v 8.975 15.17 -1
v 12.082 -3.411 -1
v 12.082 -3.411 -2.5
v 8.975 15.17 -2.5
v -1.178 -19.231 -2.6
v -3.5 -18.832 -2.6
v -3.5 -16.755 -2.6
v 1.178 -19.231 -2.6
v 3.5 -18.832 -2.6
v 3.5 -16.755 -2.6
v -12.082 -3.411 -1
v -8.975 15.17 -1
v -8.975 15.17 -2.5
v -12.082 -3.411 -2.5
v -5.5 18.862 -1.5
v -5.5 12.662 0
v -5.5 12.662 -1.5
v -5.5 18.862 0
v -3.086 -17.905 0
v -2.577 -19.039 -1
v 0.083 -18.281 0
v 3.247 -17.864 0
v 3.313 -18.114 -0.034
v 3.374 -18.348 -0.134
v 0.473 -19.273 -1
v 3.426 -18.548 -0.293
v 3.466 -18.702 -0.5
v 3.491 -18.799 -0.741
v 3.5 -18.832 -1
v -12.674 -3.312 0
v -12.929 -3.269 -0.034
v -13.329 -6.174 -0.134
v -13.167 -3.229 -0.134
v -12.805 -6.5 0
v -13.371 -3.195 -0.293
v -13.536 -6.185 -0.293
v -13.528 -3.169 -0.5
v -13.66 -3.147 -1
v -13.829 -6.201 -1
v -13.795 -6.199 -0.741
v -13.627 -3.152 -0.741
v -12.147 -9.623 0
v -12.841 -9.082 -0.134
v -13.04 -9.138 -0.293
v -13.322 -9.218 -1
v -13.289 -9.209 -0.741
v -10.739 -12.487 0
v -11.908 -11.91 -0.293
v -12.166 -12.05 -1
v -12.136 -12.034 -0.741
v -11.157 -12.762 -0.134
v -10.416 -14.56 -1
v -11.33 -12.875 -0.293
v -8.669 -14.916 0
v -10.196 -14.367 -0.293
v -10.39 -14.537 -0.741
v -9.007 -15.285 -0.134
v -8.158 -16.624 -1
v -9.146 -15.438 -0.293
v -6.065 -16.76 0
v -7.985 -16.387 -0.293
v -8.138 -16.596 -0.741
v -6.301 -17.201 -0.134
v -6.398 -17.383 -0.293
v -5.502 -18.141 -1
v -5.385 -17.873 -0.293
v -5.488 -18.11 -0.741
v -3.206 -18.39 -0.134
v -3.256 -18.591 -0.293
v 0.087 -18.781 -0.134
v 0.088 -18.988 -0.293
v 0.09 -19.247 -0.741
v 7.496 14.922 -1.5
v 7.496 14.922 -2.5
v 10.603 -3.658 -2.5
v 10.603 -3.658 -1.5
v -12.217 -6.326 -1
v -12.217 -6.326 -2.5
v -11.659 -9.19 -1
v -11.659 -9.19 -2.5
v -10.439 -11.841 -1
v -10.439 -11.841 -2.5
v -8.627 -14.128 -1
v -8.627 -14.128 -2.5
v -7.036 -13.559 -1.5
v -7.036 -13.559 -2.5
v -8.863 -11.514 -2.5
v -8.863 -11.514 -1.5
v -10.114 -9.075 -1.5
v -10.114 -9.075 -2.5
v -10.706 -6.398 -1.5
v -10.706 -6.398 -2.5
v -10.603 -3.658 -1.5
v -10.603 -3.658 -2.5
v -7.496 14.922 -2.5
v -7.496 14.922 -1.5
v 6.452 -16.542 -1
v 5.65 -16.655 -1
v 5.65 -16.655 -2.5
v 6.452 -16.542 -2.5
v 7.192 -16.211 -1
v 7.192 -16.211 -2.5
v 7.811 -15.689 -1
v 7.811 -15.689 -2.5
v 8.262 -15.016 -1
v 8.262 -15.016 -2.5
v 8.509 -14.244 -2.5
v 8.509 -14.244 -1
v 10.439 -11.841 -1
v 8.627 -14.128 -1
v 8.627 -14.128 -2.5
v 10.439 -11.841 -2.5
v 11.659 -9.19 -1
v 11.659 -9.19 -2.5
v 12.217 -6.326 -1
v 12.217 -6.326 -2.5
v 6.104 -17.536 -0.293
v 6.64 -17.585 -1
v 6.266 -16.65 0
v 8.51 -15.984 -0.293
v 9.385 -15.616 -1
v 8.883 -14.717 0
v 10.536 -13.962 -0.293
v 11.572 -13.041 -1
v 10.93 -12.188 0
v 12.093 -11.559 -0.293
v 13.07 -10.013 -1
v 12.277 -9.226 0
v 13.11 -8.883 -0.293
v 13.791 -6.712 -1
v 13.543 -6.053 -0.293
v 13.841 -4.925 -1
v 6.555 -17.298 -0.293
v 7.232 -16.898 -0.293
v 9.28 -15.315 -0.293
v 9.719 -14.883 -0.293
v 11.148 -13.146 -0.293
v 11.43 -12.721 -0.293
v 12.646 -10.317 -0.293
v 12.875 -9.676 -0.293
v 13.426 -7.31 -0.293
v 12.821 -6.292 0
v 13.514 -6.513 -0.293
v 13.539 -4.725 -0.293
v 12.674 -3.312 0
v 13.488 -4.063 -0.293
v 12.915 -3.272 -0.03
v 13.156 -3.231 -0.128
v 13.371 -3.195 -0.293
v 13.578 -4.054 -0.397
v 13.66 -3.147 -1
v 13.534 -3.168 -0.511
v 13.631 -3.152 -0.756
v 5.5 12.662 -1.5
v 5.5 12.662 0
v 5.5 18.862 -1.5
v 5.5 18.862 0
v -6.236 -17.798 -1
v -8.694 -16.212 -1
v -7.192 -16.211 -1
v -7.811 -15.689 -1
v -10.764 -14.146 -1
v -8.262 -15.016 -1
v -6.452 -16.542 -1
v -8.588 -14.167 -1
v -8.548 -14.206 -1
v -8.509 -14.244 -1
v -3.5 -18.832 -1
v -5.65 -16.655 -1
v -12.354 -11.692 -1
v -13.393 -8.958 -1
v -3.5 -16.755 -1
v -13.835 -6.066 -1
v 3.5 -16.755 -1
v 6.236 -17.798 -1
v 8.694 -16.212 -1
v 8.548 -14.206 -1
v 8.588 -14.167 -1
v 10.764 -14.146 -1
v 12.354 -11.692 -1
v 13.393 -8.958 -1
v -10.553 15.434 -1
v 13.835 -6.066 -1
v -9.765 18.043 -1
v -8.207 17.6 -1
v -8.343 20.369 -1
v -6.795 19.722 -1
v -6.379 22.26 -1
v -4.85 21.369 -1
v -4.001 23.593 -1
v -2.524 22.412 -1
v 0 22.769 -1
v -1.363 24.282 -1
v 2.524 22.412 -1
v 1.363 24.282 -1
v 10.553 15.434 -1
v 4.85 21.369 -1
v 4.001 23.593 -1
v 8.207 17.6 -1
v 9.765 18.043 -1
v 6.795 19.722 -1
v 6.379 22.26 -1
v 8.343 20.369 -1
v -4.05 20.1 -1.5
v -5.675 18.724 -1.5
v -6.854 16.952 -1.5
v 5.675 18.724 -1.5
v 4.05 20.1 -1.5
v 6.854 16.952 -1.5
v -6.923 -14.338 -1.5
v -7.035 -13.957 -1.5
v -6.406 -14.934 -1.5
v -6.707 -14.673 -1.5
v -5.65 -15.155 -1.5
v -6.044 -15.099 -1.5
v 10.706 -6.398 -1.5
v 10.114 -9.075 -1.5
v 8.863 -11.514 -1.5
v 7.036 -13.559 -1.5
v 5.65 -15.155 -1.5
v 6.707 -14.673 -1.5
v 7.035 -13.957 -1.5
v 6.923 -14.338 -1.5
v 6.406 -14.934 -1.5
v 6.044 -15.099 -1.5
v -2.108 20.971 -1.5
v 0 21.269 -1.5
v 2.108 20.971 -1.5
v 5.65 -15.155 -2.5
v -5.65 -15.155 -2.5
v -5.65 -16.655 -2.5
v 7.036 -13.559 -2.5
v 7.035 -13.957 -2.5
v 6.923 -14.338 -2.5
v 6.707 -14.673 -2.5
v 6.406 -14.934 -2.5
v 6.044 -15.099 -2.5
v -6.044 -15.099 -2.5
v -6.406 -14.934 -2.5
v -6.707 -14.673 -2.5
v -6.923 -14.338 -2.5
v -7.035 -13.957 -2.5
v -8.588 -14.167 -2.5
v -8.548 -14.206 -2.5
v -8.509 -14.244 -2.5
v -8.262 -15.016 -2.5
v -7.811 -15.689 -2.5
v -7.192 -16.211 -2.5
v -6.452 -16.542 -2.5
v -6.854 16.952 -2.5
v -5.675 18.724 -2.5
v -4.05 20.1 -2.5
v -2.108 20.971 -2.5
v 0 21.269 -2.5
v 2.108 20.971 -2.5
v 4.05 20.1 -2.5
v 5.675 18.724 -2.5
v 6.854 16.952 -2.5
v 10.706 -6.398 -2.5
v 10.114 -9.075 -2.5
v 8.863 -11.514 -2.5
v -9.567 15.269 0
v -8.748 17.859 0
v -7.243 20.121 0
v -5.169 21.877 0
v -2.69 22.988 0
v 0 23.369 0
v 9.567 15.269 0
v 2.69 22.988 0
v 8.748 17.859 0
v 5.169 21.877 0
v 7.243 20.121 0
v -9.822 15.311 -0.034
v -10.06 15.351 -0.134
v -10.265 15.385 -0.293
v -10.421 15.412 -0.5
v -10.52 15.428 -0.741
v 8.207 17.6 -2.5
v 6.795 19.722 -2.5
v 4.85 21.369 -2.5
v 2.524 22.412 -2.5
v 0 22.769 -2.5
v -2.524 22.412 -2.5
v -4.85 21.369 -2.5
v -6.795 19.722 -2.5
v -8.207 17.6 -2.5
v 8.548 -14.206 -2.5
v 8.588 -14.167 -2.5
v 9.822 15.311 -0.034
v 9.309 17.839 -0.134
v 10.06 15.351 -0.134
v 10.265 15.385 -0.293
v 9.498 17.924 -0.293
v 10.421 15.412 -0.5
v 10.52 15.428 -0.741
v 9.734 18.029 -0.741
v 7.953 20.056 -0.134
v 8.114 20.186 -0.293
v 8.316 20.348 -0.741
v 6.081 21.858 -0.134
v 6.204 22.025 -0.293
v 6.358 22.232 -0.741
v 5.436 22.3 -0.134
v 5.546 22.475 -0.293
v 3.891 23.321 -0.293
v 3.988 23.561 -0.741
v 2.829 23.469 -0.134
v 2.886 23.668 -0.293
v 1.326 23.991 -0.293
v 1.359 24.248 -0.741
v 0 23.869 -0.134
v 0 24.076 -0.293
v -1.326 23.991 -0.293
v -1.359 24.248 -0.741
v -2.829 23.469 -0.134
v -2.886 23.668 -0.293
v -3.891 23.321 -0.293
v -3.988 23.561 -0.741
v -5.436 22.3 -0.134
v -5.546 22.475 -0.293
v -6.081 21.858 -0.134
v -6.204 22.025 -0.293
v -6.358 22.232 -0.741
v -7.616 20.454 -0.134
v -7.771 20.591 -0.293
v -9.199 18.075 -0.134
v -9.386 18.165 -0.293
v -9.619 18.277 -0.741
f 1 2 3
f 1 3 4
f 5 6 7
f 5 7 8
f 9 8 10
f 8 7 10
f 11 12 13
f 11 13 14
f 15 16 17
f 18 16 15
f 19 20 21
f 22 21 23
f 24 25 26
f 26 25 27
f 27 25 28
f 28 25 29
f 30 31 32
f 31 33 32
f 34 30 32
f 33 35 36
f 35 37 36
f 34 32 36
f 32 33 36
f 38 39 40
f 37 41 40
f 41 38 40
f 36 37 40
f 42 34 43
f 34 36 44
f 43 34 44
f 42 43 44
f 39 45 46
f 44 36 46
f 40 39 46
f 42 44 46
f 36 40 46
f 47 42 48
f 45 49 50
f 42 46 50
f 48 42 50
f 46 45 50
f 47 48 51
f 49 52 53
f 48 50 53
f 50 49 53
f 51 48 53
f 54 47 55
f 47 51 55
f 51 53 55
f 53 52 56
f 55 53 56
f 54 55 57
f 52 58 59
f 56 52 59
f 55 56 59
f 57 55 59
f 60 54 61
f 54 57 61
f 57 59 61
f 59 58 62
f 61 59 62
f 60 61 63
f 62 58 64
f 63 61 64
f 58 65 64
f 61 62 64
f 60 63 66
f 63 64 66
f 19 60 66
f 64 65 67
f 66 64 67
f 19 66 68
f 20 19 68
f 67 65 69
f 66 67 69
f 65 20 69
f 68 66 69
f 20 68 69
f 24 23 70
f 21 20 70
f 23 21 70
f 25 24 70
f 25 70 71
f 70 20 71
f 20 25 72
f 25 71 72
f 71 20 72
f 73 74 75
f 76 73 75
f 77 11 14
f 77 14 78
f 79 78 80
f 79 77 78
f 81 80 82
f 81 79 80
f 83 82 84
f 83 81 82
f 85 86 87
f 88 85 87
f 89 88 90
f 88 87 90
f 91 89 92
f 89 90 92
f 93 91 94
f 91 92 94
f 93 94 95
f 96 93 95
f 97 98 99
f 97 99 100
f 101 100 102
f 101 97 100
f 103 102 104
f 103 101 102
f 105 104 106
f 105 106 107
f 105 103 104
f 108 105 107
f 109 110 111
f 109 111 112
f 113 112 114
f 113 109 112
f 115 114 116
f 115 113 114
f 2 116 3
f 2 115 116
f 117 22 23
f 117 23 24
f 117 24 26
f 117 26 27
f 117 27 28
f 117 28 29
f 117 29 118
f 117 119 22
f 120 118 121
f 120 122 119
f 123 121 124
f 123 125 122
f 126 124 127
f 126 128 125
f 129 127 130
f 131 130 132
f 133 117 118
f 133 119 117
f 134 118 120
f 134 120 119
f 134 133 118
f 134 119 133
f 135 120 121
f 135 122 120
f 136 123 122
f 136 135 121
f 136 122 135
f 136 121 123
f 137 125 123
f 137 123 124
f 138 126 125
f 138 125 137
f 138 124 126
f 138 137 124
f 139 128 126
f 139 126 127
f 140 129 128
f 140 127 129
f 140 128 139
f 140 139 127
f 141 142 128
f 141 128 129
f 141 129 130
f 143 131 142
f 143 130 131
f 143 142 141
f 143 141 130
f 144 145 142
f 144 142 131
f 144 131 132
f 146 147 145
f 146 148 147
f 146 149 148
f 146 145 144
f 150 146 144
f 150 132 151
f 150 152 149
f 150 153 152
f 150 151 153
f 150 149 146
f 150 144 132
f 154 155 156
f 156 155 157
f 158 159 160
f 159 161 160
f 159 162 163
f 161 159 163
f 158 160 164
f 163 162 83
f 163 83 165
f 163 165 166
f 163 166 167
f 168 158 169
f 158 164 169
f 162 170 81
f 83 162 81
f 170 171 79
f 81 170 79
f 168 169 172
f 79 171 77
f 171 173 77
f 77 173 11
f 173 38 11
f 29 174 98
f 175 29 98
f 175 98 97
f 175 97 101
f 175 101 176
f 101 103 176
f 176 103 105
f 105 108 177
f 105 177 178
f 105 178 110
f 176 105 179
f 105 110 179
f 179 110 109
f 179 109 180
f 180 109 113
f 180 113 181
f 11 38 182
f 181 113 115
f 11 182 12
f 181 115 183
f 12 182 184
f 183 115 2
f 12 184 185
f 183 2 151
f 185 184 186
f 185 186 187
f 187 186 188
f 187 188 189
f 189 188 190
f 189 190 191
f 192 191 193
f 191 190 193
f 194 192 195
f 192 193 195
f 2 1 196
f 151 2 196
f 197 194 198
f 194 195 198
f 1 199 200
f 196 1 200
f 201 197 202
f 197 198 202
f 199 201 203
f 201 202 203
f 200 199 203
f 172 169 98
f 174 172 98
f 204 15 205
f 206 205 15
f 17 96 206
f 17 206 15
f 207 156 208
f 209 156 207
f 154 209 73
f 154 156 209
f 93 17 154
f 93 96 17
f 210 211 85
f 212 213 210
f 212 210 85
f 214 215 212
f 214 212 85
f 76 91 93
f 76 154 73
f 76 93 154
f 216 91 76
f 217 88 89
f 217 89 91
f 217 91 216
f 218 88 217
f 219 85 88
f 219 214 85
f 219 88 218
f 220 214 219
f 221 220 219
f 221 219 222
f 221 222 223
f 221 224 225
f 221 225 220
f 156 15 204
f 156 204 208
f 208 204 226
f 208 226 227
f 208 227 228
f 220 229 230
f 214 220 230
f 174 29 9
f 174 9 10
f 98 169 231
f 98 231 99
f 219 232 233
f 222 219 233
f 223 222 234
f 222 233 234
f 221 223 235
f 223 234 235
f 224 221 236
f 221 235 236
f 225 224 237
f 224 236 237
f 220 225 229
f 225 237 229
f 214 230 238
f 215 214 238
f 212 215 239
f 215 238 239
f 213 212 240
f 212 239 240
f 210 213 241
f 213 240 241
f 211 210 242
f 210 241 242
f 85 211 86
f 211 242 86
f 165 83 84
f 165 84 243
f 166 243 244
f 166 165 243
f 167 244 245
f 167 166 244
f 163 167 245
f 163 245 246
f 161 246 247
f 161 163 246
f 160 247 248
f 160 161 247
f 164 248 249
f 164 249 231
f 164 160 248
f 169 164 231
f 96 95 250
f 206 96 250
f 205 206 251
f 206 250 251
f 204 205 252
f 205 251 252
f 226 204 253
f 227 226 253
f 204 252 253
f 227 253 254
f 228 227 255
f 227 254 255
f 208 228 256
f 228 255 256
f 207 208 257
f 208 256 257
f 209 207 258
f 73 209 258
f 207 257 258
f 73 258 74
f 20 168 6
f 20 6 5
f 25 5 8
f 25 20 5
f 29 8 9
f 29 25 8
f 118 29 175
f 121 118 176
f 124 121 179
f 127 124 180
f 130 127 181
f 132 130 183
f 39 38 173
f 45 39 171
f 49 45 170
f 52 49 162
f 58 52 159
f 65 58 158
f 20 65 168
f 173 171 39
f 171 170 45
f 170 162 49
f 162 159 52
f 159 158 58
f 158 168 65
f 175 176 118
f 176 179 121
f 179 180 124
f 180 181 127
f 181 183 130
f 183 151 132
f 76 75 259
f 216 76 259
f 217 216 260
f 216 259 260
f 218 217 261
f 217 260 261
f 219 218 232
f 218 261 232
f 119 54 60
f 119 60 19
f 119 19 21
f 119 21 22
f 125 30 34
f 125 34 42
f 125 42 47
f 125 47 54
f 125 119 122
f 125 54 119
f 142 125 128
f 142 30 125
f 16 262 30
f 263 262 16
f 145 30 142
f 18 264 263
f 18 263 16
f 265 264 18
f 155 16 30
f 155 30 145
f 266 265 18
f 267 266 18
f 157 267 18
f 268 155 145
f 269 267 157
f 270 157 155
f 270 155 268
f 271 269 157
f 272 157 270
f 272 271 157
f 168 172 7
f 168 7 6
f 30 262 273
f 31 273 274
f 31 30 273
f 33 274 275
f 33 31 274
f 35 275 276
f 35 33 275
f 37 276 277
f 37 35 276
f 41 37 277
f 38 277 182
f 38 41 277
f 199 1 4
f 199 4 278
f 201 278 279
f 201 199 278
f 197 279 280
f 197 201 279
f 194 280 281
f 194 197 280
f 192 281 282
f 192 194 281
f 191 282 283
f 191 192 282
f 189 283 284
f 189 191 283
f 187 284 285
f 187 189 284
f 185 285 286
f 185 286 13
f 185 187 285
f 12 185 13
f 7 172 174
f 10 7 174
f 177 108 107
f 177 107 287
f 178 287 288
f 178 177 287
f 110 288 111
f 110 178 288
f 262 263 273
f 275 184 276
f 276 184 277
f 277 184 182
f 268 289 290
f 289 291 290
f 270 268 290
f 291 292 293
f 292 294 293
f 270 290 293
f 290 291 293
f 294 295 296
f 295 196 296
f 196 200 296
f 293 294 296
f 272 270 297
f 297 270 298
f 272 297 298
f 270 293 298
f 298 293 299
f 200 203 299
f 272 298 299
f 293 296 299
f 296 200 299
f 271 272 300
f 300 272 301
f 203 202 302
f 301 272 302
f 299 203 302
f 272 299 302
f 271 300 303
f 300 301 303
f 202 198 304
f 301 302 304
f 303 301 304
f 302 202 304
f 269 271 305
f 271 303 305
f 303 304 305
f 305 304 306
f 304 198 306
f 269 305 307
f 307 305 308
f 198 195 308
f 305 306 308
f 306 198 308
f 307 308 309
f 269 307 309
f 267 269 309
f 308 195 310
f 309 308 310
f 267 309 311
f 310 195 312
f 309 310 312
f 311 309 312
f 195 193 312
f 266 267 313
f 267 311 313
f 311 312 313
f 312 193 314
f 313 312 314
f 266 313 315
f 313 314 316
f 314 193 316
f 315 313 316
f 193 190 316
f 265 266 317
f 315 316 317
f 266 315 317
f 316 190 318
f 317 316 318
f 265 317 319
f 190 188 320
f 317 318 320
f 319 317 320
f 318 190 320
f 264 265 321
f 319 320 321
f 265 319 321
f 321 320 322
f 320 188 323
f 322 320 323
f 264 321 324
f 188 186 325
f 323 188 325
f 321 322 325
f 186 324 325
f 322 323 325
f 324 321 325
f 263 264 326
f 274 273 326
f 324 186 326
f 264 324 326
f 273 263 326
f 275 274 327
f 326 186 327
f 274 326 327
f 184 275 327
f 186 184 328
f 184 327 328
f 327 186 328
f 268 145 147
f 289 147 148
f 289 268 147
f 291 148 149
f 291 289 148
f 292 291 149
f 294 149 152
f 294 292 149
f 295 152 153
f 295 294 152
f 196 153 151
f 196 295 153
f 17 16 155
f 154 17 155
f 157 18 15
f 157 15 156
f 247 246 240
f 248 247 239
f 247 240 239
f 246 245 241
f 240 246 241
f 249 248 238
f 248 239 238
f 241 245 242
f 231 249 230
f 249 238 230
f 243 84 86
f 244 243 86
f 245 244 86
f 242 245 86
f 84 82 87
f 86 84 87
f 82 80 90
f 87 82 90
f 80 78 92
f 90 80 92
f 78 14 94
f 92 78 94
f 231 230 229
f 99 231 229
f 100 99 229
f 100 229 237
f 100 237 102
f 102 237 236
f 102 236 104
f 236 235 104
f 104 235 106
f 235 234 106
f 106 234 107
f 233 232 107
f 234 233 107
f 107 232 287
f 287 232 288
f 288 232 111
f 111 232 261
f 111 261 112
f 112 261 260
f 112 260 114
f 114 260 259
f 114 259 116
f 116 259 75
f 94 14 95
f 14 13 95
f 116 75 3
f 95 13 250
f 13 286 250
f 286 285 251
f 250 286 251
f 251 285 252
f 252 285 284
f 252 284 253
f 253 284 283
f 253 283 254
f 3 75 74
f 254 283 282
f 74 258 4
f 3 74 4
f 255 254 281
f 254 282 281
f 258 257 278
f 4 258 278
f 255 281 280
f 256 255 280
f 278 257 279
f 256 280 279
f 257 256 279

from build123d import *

# Parameters (mm, degrees)
F1_DEPTH = 1
F2_W     = 0.6565612018
F2_H     = 2.5395583361
F2_W_2   = 0.6960576609
F2_W_3   = 0.8317038625
F2_H_2   = 3.7825570011
F2_W_4   = 0.7836289912
F3_DEPTH = 2.5
F2_W_5   = 7
F2_H_3   = 1.2
F4_DEPTH = 2.6
F6_DEPTH = 1
F7_R     = 0.99999
F8_W     = 11
F8_H     = 6.2
F9_DEPTH = 6


# Not quite as in the source:
# - a fillet or chamfer is up to 0.001 mm smaller than in the source, because OpenCascade refuses the exact size


with BuildPart() as f1:
    # F0 (on Top) → F1 (new body)
    with BuildSketch(Plane.XY):
        with BuildLine():
            ThreePointArc((10.5534817095, 15.4336250836), (0, 24.3689653978), (-10.5534817095, 15.4336250836))
            Line((-10.5534817095, 15.4336250836), (-13.6603478203, -3.1468722986))
            ThreePointArc((-13.6603478203, -3.1468722986), (0, -19.2810346022), (13.6603478203, -3.1468722986))
            Line((13.6603478203, -3.1468722986), (10.5534817095, 15.4336250836))
        make_face()
        with BuildLine():
            ThreePointArc((-12.1808877675, -3.3942544975), (-10.7458713669, 0.6557337165), (-8.0101498113, 3.9689653978))
            ThreePointArc((-8.0101498113, 3.9689653978), (-7.3298242511, 6.556361809), (-8.0101498113, 9.1437582202))
            ThreePointArc((-8.0101498113, 9.1437582202), (-9.0606365073, 12.0737017575), (-9.0740216568, 15.1862428847))
            ThreePointArc((-9.0740216568, 15.1862428847), (0, 22.8689653978), (9.0740216568, 15.1862428847))
            ThreePointArc((9.0740216568, 15.1862428847), (9.0606535532, 12.0737985759), (8.0102465186, 9.1439294077))
            ThreePointArc((8.0102465186, 9.1439294077), (8.0101981654, 9.1438438137), (8.0101498113, 9.1437582202))
            ThreePointArc((8.0101498113, 9.1437582202), (7.3298242511, 6.556361809), (8.0101498113, 3.9689653978))
            ThreePointArc((8.0101498113, 3.9689653978), (10.7458713669, 0.6557337165), (12.1808877675, -3.3942544975))
            ThreePointArc((12.1808877675, -3.3942544975), (0, -17.7810346022), (-12.1808877675, -3.3942544975))
        make_face(mode=Mode.SUBTRACT)
        with BuildLine():
            Line((8.0101498113, 3.9689653978), (-8.0101498113, 3.9689653978))
            ThreePointArc((-8.0101498113, 3.9689653978), (-10.7458713669, 0.6557337165), (-12.1808877675, -3.3942544975))
            ThreePointArc((-12.1808877675, -3.3942544975), (0, -17.7810346022), (12.1808877675, -3.3942544975))
            ThreePointArc((12.1808877675, -3.3942544975), (10.7458713669, 0.6557337165), (8.0101498113, 3.9689653978))
        make_face()
        with BuildLine():
            ThreePointArc((-8.0101498113, 9.1437582202), (-7.3298242511, 6.556361809), (-8.0101498113, 3.9689653978))
            Line((-8.0101498113, 3.9689653978), (8.0101498113, 3.9689653978))
            ThreePointArc((8.0101498113, 3.9689653978), (7.3298242511, 6.556361809), (8.0101498113, 9.1437582202))
            ThreePointArc((8.0101498113, 9.1437582202), (0, 4.4689653978), (-8.0101498113, 9.1437582202))
        make_face()
        with BuildLine():
            ThreePointArc((-9.0740216568, 15.1862428847), (-9.0606365073, 12.0737017575), (-8.0101498113, 9.1437582202))
            ThreePointArc((-8.0101498113, 9.1437582202), (0, 4.4689653978), (8.0101498113, 9.1437582202))
            ThreePointArc((8.0101498113, 9.1437582202), (8.0101981654, 9.1438438137), (8.0102465186, 9.1439294077))
            ThreePointArc((8.0102465186, 9.1439294077), (9.0606535532, 12.0737985759), (9.0740216568, 15.1862428847))
            ThreePointArc((9.0740216568, 15.1862428847), (0, 22.8689653978), (-9.0740216568, 15.1862428847))
        make_face()
    extrude(amount=-F1_DEPTH)

    # F2 (on face) → F3 (join)
    with BuildSketch(Plane.XY):
        with BuildLine():
            ThreePointArc((-12.0822570973, -3.4107466441), (-11.6589837477, -9.190103366), (-8.626729972, -14.1282772682))
            ThreePointArc((-8.626729972, -14.1282772682), (-8.5678329378, -14.1863038014), (-8.5085456051, -14.2439314975))
            ThreePointArc((-8.5085456051, -14.2439314975), (-7.5199061996, -15.9719752427), (-5.65, -16.6553447357))
            Line((-5.65, -16.6553447357), (5.65, -16.6553447357))
            ThreePointArc((5.65, -16.6553447357), (7.5199061996, -15.9719752427), (8.5085456051, -14.2439314975))
            ThreePointArc((8.5085456051, -14.2439314975), (8.5678329378, -14.1863038014), (8.626729972, -14.1282772682))
            ThreePointArc((8.626729972, -14.1282772682), (11.6589837477, -9.190103366), (12.0822570973, -3.4107466441))
            Line((12.0822570973, -3.4107466441), (8.9753909866, 15.1697507381))
            ThreePointArc((8.9753909866, 15.1697507381), (0, 22.7689653978), (-8.9753909866, 15.1697507381))
            Line((-8.9753909866, 15.1697507381), (-12.0822570973, -3.4107466441))
        make_face()
        with Locations((-8.9782806009, -11.8910893798)):
            Rectangle(F2_W, F2_H, mode=Mode.SUBTRACT)
        with Locations((8.9980288304, -11.8910893798)):
            Rectangle(F2_W_2, F2_H, mode=Mode.SUBTRACT)
        with Locations((-9.0658519313, 9.3533767637)):
            Rectangle(F2_W_3, F2_H_2, mode=Mode.SUBTRACT)
        with Locations((9.0418144956, 9.3533767637)):
            Rectangle(F2_W_4, F2_H_2, mode=Mode.SUBTRACT)
        with Locations((-9.0658519313, 9.3533767637)):
            Rectangle(F2_W_3, F2_H_2)
        with Locations((9.0418144956, 9.3533767637)):
            Rectangle(F2_W_4, F2_H_2)
        with Locations((8.9980288304, -11.8910893798)):
            Rectangle(F2_W_2, F2_H)
        with Locations((-8.9782806009, -11.8910893798)):
            Rectangle(F2_W, F2_H)
    extrude(amount=-F3_DEPTH)

    # F2 (on face) → F4 (join)
    with BuildSketch(Plane.XY):
        with BuildLine():
            Line((3.5, -17.9553447357), (-3.5, -17.9553447357))
            Line((-3.5, -17.9553447357), (-3.5, -18.831501012))
            ThreePointArc((-3.5, -18.831501012), (0, -19.2810346022), (3.5, -18.831501012))
            Line((3.5, -18.831501012), (3.5, -17.9553447357))
        make_face()
        with Locations((0, -17.3553447357)):
            Rectangle(F2_W_5, F2_H_3)
    extrude(amount=-F4_DEPTH)

    # F5 (on face) → F6 (cut)
    with BuildSketch(Plane(origin=(0, 0, -2.5), x_dir=(1, 0, 0), z_dir=(0, 0, -1))):
        with BuildLine():
            Line((-10.602797021, 3.658128847), (-7.4959309103, -14.9223685352))
            ThreePointArc((-7.4959309103, -14.9223685352), (0, -21.2689653739), (7.4959309103, -14.9223685352))
            Line((7.4959309103, -14.9223685352), (10.602797021, 3.658128847))
            ThreePointArc((10.602797021, 3.658128847), (10.1137042336, 9.0745886584), (7.0360940107, 13.5585114899))
            ThreePointArc((7.0360940107, 13.5585114899), (6.7072526833, 14.6730683852), (5.65, 15.1553447118))
            Line((5.65, 15.1553447118), (-5.65, 15.1553447118))
            ThreePointArc((-5.65, 15.1553447118), (-6.7072526833, 14.6730683852), (-7.0360940107, 13.5585114899))
            ThreePointArc((-7.0360940107, 13.5585114899), (-10.1137042336, 9.0745886584), (-10.602797021, 3.658128847))
        make_face()
    extrude(amount=-F6_DEPTH, mode=Mode.SUBTRACT)

    # F7 (radius 1 in the source; OpenCascade refuses exactly that, so slightly less here)
    f7_edges = [f1.edges().sort_by_distance(p)[0] for p in [
        (0, -19.281035, 0),
        (0, 24.368965, 0),
        (12.106915, 6.143376, 0),
        (-12.106915, 6.143376, 0),
    ]]
    fillet(f7_edges, radius=F7_R)

    # F8 (on face) → F9 (cut)
    with BuildSketch(Plane.XY):
        with Locations((0, 15.7622105017)):
            Rectangle(F8_W, F8_H)
    extrude(amount=-F9_DEPTH, mode=Mode.SUBTRACT)


solid = f1.part
